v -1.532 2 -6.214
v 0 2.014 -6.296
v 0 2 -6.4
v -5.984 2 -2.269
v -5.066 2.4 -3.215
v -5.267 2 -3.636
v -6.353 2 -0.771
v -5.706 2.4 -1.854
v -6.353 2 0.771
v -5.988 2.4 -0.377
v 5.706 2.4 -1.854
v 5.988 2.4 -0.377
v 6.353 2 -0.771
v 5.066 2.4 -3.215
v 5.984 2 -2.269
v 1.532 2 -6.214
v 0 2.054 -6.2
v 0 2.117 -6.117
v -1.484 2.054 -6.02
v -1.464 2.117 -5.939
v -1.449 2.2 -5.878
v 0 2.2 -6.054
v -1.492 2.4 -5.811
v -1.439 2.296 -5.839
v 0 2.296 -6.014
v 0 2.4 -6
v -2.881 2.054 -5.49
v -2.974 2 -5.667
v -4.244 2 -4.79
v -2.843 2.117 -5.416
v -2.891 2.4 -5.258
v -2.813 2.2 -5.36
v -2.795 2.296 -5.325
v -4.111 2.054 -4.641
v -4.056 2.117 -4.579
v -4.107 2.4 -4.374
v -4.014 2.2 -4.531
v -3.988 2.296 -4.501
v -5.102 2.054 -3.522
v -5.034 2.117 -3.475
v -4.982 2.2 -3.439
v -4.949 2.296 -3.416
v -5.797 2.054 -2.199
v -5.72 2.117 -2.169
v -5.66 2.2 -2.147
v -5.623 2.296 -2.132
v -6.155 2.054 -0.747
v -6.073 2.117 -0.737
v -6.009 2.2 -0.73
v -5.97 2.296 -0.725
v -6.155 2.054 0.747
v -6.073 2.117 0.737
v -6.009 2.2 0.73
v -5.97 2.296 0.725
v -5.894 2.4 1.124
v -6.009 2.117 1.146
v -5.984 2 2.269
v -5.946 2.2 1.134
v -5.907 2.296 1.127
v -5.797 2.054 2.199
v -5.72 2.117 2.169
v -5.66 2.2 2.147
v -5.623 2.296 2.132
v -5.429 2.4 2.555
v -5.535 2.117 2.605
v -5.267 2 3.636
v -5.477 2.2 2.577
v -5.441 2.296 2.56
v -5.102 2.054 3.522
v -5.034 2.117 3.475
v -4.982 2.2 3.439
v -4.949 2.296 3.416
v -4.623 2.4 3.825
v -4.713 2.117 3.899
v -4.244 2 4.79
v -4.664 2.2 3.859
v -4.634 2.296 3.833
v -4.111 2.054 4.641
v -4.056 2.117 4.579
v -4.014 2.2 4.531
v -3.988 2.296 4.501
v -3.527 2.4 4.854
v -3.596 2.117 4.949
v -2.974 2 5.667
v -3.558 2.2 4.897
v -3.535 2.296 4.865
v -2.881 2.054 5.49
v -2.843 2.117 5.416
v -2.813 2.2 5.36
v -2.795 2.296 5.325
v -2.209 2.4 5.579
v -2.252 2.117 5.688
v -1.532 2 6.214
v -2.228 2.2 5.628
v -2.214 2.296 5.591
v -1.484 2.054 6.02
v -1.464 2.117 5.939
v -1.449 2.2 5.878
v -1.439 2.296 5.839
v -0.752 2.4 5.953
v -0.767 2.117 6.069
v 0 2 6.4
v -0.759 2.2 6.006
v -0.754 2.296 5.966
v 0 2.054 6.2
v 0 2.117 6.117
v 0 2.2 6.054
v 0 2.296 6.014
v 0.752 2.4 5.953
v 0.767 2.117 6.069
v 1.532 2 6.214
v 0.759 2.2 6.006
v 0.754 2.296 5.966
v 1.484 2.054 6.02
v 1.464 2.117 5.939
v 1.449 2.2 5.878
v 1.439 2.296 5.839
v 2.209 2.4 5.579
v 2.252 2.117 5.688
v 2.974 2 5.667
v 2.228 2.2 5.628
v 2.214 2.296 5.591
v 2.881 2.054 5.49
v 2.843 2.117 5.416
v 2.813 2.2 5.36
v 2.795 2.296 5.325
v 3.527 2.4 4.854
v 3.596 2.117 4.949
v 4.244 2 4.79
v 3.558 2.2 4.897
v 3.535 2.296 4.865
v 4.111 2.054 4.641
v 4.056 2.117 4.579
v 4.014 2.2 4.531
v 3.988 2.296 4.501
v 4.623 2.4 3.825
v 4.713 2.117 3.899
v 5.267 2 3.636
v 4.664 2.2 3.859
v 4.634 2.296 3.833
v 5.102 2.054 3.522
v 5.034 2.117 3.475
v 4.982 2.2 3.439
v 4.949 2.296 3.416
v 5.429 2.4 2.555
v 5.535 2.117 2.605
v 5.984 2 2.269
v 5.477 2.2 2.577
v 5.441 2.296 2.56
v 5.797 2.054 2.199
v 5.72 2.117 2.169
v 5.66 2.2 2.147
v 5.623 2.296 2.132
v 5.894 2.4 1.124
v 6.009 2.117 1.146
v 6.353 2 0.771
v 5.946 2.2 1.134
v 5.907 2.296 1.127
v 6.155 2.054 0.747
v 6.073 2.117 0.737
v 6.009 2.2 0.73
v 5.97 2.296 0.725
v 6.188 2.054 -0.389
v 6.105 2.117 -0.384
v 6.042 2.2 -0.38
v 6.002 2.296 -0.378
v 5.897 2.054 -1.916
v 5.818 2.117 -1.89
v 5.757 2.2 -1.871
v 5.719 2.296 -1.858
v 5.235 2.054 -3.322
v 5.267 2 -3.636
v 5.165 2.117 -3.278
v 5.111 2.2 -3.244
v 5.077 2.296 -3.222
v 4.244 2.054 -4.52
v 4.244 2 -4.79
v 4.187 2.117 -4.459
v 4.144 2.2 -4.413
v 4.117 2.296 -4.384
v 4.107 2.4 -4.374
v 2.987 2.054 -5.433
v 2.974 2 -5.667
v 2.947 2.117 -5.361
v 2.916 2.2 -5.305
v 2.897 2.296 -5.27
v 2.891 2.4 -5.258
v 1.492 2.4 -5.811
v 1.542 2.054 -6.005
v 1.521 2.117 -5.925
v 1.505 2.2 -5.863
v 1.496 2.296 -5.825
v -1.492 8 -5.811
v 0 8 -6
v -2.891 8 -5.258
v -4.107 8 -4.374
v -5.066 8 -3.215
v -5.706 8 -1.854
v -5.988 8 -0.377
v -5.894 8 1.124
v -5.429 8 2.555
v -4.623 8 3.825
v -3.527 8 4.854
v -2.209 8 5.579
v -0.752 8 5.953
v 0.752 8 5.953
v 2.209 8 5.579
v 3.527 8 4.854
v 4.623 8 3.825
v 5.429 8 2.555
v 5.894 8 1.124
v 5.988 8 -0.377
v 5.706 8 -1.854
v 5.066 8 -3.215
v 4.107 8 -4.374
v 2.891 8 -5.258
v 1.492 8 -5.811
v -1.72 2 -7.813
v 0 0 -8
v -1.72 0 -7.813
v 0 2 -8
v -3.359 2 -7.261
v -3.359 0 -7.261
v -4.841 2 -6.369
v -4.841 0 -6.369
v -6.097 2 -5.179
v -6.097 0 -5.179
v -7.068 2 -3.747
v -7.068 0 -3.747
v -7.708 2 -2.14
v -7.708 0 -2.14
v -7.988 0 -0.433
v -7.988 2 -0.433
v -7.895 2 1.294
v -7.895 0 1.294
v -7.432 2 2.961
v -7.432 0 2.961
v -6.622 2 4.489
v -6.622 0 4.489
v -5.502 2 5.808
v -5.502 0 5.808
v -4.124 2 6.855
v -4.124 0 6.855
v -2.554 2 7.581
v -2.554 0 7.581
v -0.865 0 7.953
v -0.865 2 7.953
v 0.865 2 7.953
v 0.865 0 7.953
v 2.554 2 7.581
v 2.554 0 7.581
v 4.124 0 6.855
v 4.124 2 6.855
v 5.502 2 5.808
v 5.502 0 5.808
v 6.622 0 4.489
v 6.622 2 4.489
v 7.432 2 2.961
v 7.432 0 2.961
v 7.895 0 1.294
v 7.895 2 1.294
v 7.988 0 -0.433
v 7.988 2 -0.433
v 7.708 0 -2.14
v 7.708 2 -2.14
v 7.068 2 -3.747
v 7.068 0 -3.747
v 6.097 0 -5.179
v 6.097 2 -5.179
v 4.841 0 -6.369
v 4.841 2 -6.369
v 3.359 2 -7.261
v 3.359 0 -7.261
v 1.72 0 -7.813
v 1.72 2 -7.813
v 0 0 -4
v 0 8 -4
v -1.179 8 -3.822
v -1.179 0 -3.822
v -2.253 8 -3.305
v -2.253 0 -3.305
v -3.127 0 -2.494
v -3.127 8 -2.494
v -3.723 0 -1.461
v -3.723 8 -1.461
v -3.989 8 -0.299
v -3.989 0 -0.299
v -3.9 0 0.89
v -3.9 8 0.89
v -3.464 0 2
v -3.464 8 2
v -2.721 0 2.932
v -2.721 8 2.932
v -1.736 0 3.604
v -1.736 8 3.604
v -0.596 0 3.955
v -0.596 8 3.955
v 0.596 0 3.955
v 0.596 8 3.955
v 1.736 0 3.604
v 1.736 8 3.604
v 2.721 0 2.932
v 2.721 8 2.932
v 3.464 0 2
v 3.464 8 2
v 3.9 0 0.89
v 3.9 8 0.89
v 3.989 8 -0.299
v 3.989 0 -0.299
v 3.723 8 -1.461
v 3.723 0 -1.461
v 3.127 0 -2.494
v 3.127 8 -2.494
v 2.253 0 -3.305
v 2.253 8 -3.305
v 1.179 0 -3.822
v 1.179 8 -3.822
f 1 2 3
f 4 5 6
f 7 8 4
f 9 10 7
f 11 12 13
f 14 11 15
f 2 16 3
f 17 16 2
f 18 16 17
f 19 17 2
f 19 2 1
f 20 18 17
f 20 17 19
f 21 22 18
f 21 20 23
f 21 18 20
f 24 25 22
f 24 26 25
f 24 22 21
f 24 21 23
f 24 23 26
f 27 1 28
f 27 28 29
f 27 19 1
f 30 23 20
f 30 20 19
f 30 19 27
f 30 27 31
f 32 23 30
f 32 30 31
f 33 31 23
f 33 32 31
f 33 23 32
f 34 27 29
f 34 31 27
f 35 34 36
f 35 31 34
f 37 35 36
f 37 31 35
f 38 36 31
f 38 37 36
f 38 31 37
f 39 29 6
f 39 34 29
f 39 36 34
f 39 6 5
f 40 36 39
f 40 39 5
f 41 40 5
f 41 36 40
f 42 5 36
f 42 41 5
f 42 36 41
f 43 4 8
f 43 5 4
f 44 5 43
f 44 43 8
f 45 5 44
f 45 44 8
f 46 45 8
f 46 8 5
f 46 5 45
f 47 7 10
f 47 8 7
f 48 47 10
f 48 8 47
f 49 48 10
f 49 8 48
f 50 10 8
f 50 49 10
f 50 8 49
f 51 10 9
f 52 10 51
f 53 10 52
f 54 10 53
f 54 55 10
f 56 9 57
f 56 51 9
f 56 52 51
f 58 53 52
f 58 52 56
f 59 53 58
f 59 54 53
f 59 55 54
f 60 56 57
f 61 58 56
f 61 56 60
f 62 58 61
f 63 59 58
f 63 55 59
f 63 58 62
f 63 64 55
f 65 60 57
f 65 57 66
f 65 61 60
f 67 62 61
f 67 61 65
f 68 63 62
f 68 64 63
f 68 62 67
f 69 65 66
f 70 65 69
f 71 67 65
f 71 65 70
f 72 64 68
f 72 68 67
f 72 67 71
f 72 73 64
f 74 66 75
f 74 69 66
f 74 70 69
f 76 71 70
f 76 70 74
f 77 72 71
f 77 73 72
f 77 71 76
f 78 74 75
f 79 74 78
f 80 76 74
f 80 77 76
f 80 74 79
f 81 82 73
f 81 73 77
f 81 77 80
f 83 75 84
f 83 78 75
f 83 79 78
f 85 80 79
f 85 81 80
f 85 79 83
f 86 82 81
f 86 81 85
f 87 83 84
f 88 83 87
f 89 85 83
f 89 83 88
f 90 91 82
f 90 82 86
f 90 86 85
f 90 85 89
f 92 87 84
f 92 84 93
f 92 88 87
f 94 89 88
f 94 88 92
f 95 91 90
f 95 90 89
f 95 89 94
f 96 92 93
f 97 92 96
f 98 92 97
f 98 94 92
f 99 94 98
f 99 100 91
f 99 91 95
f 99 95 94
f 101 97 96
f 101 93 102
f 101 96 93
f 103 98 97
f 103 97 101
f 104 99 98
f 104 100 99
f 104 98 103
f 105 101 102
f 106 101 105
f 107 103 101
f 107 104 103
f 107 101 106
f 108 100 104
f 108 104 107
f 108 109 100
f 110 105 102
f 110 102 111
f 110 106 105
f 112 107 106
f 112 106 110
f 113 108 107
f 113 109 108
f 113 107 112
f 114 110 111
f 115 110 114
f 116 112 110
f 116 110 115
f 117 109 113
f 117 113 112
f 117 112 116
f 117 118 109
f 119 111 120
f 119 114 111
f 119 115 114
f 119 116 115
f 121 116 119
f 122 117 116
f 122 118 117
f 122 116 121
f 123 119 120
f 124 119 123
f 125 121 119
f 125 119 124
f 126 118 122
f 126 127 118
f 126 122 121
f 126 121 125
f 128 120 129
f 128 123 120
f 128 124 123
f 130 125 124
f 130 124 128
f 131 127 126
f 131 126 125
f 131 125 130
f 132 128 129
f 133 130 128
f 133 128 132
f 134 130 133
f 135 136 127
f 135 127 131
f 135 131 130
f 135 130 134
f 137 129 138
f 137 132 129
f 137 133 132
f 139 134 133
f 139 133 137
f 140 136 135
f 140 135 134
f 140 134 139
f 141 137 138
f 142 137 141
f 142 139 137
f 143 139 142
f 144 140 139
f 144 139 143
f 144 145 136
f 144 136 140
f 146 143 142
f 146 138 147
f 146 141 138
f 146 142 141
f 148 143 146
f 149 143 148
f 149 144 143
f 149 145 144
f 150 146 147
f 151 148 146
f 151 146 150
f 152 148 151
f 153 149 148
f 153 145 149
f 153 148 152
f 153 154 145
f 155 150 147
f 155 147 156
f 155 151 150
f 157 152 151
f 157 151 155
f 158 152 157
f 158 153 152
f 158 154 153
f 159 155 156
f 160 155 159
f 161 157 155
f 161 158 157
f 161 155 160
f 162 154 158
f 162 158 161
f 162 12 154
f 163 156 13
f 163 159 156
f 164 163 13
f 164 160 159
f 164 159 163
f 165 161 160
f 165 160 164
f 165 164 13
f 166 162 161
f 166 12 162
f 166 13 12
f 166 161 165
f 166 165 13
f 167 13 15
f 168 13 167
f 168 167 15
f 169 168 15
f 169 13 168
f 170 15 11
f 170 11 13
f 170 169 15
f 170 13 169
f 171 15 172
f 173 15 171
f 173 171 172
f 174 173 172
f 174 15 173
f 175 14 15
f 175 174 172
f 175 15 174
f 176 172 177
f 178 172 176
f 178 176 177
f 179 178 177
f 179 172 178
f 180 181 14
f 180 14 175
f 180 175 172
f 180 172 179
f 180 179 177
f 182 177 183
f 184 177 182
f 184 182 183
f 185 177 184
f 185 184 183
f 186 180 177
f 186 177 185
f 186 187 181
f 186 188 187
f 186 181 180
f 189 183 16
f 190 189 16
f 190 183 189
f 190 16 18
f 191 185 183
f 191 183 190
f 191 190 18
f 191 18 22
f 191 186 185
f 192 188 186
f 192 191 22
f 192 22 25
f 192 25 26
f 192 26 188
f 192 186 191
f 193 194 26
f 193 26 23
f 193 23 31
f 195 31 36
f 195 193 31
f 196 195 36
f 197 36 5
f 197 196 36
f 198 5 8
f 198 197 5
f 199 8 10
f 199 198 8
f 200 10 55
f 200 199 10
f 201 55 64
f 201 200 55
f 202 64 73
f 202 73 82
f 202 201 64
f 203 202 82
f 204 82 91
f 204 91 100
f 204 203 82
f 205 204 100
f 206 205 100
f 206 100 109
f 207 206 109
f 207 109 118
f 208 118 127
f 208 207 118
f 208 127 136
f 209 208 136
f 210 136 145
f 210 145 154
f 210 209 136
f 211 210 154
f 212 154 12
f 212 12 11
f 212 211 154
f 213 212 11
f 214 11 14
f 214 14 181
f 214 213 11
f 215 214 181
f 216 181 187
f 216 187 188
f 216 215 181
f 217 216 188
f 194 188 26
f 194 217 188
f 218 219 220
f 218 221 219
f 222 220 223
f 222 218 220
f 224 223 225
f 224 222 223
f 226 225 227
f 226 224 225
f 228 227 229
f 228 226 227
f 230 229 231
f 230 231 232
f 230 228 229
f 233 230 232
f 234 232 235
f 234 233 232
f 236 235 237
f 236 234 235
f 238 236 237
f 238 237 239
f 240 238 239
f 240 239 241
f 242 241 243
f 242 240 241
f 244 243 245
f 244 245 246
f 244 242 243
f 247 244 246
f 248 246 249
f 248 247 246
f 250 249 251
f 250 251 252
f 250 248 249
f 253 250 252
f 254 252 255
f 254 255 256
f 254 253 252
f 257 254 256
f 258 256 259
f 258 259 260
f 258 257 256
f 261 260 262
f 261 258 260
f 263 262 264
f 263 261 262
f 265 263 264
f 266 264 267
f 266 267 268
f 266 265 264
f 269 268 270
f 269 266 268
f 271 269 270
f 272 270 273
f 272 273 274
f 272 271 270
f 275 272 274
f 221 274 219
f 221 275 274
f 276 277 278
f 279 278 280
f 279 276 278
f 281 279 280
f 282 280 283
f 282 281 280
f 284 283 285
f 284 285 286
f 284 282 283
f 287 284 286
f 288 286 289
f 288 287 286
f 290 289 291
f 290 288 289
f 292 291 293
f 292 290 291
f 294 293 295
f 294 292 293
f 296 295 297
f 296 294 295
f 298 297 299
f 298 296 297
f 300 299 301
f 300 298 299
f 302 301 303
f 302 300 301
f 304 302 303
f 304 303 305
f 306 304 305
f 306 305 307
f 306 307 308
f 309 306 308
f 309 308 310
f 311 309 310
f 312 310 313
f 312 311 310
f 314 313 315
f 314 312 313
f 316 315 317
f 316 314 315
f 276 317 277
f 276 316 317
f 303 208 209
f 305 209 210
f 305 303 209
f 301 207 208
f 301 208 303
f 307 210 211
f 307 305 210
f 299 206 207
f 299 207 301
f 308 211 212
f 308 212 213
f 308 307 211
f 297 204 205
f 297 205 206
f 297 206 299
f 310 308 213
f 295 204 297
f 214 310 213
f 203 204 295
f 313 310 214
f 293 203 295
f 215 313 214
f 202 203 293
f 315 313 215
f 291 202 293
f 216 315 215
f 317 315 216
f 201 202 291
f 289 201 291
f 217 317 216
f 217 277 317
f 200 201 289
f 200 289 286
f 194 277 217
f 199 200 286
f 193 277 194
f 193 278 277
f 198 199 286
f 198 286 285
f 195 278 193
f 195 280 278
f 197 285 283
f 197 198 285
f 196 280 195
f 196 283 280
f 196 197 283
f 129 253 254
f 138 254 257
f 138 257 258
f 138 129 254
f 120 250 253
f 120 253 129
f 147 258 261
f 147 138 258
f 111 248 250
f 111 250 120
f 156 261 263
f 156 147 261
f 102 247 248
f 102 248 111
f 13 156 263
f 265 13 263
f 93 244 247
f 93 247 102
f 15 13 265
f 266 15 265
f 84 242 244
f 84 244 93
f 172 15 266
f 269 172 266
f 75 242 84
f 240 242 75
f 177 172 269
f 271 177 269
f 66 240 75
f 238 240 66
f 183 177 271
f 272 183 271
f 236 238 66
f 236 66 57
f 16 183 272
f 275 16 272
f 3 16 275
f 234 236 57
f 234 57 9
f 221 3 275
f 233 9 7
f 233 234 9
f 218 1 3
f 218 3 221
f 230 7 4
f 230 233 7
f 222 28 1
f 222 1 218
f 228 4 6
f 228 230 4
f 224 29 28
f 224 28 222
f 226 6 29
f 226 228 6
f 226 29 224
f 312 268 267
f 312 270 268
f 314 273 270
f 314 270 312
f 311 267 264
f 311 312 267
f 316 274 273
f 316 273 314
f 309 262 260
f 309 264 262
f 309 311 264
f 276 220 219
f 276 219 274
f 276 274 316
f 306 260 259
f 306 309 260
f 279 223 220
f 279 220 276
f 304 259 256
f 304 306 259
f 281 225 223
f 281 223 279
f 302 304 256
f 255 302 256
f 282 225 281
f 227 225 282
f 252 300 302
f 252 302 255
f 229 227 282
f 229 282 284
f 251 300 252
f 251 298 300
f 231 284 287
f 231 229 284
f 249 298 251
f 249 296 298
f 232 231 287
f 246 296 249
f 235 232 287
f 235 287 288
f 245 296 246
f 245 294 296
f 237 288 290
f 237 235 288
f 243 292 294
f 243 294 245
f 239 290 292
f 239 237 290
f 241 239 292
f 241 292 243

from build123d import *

# Parameters (mm, degrees)
FILLET1_R = 0.4


with BuildPart() as part:
    # Sketch1 → Revolve1 (revolve)
    with BuildSketch(Plane(origin=(0, 0, 0), x_dir=(0, 0, -1), z_dir=(1, 0, 0))):
        Polygon((4, 8), (4, 0), (8, 0), (8, 2), (6, 2), (6, 8), align=None)
    revolve(axis=Axis((0, 0, 0), (0, 1, 0)))

    # Fillet1
    fillet1_edges = [part.edges().sort_by_distance(p)[0] for p in [
        (0, 2, 6),
    ]]
    fillet(fillet1_edges, radius=FILLET1_R)


solid = part.part
